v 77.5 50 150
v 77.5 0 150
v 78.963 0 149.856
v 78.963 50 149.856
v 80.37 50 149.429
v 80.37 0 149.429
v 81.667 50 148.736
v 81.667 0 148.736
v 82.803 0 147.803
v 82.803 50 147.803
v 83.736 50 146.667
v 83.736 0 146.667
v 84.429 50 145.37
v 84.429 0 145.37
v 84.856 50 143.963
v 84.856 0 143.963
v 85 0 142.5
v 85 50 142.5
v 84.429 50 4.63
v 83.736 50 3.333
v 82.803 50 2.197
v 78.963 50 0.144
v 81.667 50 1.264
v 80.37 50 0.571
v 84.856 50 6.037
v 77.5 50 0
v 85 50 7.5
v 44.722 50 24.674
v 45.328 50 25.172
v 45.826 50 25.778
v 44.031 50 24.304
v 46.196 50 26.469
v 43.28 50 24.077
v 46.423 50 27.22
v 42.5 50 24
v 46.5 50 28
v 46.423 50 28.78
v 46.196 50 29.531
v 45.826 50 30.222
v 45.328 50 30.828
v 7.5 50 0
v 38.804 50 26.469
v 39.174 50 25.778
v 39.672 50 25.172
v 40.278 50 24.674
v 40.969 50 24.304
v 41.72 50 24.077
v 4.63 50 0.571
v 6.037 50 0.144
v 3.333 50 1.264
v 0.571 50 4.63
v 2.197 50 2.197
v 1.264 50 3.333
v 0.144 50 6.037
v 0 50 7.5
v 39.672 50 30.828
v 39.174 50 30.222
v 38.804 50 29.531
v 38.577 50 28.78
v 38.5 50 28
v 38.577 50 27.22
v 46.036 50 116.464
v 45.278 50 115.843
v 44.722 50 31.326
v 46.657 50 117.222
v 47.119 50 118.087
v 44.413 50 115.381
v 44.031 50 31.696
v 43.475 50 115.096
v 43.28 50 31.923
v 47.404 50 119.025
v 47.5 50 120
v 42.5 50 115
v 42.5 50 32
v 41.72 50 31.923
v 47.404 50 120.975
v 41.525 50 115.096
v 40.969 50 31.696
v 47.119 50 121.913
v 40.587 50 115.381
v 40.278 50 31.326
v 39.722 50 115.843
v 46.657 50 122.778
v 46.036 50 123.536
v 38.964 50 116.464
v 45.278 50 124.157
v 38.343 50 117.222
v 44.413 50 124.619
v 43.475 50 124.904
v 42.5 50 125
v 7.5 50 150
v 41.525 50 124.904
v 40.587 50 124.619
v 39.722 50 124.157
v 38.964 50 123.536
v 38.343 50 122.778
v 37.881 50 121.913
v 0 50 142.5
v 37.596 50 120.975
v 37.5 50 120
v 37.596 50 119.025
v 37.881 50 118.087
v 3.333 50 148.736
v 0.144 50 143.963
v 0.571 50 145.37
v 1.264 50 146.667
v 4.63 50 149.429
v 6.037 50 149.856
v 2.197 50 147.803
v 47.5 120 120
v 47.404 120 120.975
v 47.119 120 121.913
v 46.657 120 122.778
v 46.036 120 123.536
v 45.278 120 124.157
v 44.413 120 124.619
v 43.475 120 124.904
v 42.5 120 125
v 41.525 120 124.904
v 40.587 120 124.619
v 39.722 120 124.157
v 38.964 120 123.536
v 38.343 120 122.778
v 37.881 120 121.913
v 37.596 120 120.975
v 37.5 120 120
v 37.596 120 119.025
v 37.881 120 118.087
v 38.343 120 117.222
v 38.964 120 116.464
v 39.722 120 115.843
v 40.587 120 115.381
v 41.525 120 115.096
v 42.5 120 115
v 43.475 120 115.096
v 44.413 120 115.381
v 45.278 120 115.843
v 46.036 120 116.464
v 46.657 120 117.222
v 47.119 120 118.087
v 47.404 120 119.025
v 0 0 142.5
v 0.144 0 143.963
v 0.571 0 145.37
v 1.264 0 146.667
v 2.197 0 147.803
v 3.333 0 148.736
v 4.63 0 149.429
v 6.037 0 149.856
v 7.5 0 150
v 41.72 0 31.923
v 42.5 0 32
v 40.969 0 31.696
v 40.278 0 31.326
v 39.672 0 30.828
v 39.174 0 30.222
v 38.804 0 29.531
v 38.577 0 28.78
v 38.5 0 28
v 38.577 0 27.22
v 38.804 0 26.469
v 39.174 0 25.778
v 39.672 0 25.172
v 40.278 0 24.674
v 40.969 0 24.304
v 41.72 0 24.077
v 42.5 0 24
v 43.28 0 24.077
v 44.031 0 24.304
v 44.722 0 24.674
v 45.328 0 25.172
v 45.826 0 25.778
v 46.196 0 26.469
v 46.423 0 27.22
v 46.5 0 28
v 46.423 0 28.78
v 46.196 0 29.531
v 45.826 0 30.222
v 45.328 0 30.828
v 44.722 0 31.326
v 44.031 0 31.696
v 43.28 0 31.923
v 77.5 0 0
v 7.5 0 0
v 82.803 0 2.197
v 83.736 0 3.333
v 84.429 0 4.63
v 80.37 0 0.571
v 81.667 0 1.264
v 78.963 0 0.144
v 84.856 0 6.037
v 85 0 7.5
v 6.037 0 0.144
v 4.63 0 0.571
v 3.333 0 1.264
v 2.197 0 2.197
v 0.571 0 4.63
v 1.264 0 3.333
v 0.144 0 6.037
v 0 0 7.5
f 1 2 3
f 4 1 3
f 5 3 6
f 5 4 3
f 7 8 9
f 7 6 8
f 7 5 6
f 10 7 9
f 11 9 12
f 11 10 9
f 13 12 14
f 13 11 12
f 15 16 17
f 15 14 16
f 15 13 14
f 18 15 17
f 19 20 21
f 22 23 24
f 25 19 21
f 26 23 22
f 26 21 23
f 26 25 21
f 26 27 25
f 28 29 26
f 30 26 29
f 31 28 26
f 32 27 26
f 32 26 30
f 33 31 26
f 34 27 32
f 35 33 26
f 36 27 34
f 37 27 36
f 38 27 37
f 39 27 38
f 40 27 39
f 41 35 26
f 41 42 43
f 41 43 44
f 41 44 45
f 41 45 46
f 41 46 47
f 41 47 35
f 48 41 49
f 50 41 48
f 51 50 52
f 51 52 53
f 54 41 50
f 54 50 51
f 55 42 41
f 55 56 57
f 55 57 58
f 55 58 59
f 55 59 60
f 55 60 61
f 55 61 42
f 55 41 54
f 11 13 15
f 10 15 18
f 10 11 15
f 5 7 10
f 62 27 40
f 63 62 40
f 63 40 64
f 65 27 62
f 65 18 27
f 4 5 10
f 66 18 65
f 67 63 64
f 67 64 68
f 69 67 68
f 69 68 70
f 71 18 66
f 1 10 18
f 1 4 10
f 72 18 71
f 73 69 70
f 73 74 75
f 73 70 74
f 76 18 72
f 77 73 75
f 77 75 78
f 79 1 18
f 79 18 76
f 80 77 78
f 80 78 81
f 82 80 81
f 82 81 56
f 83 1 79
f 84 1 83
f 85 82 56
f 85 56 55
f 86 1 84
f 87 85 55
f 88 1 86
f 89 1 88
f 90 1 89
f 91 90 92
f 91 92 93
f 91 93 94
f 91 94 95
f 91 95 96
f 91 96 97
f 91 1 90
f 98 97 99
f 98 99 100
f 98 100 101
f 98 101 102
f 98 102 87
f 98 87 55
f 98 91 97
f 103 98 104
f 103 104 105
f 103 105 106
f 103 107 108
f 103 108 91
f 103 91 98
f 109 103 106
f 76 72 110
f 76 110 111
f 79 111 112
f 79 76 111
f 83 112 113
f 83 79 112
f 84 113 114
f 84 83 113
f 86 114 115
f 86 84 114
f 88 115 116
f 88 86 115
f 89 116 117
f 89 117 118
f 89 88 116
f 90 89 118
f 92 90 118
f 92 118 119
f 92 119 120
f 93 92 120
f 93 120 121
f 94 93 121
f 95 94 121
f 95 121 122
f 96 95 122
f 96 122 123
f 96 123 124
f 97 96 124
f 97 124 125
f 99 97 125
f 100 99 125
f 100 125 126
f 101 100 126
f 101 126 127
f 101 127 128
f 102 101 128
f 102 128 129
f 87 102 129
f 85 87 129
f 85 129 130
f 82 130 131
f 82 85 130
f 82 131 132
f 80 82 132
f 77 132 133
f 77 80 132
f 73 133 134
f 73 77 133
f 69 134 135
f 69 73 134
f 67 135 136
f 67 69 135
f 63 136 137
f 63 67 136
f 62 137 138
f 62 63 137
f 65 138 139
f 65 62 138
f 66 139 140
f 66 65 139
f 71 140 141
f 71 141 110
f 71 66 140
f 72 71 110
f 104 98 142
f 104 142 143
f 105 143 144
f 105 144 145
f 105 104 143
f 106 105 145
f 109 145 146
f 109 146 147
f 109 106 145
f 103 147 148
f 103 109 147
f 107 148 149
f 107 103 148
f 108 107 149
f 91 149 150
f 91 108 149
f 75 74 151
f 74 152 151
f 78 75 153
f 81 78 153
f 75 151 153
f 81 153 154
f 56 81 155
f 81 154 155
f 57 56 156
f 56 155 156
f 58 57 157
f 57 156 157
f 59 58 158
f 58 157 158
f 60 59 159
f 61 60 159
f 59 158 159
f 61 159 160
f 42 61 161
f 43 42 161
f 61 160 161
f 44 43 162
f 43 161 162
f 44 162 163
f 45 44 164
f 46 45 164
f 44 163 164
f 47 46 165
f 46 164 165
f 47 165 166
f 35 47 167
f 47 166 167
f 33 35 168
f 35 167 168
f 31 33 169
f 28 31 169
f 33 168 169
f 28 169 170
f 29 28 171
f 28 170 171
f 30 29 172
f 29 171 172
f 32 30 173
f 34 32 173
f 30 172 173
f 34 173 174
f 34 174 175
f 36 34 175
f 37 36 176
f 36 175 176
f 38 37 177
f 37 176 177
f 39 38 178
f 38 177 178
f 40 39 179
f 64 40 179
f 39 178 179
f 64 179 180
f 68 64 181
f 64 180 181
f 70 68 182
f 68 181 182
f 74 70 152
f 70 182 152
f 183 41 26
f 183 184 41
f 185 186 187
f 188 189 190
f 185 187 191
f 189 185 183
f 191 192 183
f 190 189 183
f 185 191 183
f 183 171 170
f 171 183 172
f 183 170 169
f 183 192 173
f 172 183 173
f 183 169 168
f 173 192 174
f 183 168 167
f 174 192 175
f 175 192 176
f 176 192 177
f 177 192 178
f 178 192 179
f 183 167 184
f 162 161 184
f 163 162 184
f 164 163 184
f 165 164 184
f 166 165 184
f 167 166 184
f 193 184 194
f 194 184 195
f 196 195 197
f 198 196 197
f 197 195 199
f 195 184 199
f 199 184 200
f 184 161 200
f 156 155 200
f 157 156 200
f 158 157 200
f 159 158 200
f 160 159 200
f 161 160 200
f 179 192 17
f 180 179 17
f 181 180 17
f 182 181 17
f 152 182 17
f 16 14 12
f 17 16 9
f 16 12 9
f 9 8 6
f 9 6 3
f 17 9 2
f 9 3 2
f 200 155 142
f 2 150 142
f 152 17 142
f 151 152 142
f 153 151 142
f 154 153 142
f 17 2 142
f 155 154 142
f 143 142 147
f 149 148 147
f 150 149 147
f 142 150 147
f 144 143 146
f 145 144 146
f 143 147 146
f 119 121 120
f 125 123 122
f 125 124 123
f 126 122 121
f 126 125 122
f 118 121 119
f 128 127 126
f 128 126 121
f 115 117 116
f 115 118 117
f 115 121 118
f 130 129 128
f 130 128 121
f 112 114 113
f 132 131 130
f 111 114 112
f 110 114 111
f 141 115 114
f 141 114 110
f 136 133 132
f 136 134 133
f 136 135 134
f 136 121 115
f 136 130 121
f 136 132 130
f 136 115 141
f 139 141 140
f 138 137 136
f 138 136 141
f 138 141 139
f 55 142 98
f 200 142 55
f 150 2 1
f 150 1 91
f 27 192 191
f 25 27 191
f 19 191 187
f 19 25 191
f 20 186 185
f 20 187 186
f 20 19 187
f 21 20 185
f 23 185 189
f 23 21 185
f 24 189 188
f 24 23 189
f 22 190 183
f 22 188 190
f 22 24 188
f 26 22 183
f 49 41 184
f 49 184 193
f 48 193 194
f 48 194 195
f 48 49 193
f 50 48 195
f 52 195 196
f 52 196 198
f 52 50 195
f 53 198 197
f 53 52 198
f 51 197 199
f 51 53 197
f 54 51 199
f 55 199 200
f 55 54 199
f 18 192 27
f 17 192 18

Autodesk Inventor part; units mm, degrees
ref_plane "YZ Plane" through (0, 0, 0) normal (1, 0, 0) x (0, 1, 0)
ref_plane "XZ Plane" through (0, 0, 0) normal (0, 1, 0) x (-1, 0, 0)
ref_plane "XY Plane" through (0, 0, 0) normal (0, 0, 1) x (1, 0, 0)
sketch "Эскиз1" plane through (0, 0, 0) normal (0, 1, 0) x (-1, 0, 0)
  line L0 (0, 0) -> (-85, 0)
  line L1 (-85, 0) -> (-85, 150)
  line L2 (-85, 150) -> (0, 150)
  line L3 (0, 150) -> (0, 0)
  dimension "d0" = 85
  dimension "d1" = 150
extrude "Выдавливание1" add sketch "Эскиз1" along normal blind 50
sketch "Эскиз2" plane through (0, 50, 0) normal (0, 1, 0) x (1, 0, 0)
  line L0 (0, 0) -> (0, -150) projected
  line L1 (0, 0) -> (42.5, 0)
  line L2 (85, 0) -> (0, 0) projected
  line L3 (42.5, 0) -> (42.5, -28)
  dimension "d5" = 42.5
  dimension "d6" = 28
hole "Отверстие1" at (42.5, 50, 28) direction (0, -1, 0) diameter 8 end through all
sketch "Эскиз3" plane through (0, 50, 0) normal (0, 1, 0) x (1, 0, 0)
  line L0 (0, 0) -> (0, -150) projected
  line L1 (0, 0) -> (0, -120)
  line L2 (0, -120) -> (42.5, -120)
  circle A0 centre (42.5, -120) radius 5
  dimension "d14" = 120
  dimension "d15" = 42.5
  dimension "d16" = 10
extrude "Выдавливание2" add sketch "Эскиз3" along normal blind 70
fillet "Сопряжение2" radius 7.5 4 edges at (0, 25, 0) (85, 25, 0) (85, 25, 150) (0, 25, 150)
properties part number "РедукторСмещенный"
